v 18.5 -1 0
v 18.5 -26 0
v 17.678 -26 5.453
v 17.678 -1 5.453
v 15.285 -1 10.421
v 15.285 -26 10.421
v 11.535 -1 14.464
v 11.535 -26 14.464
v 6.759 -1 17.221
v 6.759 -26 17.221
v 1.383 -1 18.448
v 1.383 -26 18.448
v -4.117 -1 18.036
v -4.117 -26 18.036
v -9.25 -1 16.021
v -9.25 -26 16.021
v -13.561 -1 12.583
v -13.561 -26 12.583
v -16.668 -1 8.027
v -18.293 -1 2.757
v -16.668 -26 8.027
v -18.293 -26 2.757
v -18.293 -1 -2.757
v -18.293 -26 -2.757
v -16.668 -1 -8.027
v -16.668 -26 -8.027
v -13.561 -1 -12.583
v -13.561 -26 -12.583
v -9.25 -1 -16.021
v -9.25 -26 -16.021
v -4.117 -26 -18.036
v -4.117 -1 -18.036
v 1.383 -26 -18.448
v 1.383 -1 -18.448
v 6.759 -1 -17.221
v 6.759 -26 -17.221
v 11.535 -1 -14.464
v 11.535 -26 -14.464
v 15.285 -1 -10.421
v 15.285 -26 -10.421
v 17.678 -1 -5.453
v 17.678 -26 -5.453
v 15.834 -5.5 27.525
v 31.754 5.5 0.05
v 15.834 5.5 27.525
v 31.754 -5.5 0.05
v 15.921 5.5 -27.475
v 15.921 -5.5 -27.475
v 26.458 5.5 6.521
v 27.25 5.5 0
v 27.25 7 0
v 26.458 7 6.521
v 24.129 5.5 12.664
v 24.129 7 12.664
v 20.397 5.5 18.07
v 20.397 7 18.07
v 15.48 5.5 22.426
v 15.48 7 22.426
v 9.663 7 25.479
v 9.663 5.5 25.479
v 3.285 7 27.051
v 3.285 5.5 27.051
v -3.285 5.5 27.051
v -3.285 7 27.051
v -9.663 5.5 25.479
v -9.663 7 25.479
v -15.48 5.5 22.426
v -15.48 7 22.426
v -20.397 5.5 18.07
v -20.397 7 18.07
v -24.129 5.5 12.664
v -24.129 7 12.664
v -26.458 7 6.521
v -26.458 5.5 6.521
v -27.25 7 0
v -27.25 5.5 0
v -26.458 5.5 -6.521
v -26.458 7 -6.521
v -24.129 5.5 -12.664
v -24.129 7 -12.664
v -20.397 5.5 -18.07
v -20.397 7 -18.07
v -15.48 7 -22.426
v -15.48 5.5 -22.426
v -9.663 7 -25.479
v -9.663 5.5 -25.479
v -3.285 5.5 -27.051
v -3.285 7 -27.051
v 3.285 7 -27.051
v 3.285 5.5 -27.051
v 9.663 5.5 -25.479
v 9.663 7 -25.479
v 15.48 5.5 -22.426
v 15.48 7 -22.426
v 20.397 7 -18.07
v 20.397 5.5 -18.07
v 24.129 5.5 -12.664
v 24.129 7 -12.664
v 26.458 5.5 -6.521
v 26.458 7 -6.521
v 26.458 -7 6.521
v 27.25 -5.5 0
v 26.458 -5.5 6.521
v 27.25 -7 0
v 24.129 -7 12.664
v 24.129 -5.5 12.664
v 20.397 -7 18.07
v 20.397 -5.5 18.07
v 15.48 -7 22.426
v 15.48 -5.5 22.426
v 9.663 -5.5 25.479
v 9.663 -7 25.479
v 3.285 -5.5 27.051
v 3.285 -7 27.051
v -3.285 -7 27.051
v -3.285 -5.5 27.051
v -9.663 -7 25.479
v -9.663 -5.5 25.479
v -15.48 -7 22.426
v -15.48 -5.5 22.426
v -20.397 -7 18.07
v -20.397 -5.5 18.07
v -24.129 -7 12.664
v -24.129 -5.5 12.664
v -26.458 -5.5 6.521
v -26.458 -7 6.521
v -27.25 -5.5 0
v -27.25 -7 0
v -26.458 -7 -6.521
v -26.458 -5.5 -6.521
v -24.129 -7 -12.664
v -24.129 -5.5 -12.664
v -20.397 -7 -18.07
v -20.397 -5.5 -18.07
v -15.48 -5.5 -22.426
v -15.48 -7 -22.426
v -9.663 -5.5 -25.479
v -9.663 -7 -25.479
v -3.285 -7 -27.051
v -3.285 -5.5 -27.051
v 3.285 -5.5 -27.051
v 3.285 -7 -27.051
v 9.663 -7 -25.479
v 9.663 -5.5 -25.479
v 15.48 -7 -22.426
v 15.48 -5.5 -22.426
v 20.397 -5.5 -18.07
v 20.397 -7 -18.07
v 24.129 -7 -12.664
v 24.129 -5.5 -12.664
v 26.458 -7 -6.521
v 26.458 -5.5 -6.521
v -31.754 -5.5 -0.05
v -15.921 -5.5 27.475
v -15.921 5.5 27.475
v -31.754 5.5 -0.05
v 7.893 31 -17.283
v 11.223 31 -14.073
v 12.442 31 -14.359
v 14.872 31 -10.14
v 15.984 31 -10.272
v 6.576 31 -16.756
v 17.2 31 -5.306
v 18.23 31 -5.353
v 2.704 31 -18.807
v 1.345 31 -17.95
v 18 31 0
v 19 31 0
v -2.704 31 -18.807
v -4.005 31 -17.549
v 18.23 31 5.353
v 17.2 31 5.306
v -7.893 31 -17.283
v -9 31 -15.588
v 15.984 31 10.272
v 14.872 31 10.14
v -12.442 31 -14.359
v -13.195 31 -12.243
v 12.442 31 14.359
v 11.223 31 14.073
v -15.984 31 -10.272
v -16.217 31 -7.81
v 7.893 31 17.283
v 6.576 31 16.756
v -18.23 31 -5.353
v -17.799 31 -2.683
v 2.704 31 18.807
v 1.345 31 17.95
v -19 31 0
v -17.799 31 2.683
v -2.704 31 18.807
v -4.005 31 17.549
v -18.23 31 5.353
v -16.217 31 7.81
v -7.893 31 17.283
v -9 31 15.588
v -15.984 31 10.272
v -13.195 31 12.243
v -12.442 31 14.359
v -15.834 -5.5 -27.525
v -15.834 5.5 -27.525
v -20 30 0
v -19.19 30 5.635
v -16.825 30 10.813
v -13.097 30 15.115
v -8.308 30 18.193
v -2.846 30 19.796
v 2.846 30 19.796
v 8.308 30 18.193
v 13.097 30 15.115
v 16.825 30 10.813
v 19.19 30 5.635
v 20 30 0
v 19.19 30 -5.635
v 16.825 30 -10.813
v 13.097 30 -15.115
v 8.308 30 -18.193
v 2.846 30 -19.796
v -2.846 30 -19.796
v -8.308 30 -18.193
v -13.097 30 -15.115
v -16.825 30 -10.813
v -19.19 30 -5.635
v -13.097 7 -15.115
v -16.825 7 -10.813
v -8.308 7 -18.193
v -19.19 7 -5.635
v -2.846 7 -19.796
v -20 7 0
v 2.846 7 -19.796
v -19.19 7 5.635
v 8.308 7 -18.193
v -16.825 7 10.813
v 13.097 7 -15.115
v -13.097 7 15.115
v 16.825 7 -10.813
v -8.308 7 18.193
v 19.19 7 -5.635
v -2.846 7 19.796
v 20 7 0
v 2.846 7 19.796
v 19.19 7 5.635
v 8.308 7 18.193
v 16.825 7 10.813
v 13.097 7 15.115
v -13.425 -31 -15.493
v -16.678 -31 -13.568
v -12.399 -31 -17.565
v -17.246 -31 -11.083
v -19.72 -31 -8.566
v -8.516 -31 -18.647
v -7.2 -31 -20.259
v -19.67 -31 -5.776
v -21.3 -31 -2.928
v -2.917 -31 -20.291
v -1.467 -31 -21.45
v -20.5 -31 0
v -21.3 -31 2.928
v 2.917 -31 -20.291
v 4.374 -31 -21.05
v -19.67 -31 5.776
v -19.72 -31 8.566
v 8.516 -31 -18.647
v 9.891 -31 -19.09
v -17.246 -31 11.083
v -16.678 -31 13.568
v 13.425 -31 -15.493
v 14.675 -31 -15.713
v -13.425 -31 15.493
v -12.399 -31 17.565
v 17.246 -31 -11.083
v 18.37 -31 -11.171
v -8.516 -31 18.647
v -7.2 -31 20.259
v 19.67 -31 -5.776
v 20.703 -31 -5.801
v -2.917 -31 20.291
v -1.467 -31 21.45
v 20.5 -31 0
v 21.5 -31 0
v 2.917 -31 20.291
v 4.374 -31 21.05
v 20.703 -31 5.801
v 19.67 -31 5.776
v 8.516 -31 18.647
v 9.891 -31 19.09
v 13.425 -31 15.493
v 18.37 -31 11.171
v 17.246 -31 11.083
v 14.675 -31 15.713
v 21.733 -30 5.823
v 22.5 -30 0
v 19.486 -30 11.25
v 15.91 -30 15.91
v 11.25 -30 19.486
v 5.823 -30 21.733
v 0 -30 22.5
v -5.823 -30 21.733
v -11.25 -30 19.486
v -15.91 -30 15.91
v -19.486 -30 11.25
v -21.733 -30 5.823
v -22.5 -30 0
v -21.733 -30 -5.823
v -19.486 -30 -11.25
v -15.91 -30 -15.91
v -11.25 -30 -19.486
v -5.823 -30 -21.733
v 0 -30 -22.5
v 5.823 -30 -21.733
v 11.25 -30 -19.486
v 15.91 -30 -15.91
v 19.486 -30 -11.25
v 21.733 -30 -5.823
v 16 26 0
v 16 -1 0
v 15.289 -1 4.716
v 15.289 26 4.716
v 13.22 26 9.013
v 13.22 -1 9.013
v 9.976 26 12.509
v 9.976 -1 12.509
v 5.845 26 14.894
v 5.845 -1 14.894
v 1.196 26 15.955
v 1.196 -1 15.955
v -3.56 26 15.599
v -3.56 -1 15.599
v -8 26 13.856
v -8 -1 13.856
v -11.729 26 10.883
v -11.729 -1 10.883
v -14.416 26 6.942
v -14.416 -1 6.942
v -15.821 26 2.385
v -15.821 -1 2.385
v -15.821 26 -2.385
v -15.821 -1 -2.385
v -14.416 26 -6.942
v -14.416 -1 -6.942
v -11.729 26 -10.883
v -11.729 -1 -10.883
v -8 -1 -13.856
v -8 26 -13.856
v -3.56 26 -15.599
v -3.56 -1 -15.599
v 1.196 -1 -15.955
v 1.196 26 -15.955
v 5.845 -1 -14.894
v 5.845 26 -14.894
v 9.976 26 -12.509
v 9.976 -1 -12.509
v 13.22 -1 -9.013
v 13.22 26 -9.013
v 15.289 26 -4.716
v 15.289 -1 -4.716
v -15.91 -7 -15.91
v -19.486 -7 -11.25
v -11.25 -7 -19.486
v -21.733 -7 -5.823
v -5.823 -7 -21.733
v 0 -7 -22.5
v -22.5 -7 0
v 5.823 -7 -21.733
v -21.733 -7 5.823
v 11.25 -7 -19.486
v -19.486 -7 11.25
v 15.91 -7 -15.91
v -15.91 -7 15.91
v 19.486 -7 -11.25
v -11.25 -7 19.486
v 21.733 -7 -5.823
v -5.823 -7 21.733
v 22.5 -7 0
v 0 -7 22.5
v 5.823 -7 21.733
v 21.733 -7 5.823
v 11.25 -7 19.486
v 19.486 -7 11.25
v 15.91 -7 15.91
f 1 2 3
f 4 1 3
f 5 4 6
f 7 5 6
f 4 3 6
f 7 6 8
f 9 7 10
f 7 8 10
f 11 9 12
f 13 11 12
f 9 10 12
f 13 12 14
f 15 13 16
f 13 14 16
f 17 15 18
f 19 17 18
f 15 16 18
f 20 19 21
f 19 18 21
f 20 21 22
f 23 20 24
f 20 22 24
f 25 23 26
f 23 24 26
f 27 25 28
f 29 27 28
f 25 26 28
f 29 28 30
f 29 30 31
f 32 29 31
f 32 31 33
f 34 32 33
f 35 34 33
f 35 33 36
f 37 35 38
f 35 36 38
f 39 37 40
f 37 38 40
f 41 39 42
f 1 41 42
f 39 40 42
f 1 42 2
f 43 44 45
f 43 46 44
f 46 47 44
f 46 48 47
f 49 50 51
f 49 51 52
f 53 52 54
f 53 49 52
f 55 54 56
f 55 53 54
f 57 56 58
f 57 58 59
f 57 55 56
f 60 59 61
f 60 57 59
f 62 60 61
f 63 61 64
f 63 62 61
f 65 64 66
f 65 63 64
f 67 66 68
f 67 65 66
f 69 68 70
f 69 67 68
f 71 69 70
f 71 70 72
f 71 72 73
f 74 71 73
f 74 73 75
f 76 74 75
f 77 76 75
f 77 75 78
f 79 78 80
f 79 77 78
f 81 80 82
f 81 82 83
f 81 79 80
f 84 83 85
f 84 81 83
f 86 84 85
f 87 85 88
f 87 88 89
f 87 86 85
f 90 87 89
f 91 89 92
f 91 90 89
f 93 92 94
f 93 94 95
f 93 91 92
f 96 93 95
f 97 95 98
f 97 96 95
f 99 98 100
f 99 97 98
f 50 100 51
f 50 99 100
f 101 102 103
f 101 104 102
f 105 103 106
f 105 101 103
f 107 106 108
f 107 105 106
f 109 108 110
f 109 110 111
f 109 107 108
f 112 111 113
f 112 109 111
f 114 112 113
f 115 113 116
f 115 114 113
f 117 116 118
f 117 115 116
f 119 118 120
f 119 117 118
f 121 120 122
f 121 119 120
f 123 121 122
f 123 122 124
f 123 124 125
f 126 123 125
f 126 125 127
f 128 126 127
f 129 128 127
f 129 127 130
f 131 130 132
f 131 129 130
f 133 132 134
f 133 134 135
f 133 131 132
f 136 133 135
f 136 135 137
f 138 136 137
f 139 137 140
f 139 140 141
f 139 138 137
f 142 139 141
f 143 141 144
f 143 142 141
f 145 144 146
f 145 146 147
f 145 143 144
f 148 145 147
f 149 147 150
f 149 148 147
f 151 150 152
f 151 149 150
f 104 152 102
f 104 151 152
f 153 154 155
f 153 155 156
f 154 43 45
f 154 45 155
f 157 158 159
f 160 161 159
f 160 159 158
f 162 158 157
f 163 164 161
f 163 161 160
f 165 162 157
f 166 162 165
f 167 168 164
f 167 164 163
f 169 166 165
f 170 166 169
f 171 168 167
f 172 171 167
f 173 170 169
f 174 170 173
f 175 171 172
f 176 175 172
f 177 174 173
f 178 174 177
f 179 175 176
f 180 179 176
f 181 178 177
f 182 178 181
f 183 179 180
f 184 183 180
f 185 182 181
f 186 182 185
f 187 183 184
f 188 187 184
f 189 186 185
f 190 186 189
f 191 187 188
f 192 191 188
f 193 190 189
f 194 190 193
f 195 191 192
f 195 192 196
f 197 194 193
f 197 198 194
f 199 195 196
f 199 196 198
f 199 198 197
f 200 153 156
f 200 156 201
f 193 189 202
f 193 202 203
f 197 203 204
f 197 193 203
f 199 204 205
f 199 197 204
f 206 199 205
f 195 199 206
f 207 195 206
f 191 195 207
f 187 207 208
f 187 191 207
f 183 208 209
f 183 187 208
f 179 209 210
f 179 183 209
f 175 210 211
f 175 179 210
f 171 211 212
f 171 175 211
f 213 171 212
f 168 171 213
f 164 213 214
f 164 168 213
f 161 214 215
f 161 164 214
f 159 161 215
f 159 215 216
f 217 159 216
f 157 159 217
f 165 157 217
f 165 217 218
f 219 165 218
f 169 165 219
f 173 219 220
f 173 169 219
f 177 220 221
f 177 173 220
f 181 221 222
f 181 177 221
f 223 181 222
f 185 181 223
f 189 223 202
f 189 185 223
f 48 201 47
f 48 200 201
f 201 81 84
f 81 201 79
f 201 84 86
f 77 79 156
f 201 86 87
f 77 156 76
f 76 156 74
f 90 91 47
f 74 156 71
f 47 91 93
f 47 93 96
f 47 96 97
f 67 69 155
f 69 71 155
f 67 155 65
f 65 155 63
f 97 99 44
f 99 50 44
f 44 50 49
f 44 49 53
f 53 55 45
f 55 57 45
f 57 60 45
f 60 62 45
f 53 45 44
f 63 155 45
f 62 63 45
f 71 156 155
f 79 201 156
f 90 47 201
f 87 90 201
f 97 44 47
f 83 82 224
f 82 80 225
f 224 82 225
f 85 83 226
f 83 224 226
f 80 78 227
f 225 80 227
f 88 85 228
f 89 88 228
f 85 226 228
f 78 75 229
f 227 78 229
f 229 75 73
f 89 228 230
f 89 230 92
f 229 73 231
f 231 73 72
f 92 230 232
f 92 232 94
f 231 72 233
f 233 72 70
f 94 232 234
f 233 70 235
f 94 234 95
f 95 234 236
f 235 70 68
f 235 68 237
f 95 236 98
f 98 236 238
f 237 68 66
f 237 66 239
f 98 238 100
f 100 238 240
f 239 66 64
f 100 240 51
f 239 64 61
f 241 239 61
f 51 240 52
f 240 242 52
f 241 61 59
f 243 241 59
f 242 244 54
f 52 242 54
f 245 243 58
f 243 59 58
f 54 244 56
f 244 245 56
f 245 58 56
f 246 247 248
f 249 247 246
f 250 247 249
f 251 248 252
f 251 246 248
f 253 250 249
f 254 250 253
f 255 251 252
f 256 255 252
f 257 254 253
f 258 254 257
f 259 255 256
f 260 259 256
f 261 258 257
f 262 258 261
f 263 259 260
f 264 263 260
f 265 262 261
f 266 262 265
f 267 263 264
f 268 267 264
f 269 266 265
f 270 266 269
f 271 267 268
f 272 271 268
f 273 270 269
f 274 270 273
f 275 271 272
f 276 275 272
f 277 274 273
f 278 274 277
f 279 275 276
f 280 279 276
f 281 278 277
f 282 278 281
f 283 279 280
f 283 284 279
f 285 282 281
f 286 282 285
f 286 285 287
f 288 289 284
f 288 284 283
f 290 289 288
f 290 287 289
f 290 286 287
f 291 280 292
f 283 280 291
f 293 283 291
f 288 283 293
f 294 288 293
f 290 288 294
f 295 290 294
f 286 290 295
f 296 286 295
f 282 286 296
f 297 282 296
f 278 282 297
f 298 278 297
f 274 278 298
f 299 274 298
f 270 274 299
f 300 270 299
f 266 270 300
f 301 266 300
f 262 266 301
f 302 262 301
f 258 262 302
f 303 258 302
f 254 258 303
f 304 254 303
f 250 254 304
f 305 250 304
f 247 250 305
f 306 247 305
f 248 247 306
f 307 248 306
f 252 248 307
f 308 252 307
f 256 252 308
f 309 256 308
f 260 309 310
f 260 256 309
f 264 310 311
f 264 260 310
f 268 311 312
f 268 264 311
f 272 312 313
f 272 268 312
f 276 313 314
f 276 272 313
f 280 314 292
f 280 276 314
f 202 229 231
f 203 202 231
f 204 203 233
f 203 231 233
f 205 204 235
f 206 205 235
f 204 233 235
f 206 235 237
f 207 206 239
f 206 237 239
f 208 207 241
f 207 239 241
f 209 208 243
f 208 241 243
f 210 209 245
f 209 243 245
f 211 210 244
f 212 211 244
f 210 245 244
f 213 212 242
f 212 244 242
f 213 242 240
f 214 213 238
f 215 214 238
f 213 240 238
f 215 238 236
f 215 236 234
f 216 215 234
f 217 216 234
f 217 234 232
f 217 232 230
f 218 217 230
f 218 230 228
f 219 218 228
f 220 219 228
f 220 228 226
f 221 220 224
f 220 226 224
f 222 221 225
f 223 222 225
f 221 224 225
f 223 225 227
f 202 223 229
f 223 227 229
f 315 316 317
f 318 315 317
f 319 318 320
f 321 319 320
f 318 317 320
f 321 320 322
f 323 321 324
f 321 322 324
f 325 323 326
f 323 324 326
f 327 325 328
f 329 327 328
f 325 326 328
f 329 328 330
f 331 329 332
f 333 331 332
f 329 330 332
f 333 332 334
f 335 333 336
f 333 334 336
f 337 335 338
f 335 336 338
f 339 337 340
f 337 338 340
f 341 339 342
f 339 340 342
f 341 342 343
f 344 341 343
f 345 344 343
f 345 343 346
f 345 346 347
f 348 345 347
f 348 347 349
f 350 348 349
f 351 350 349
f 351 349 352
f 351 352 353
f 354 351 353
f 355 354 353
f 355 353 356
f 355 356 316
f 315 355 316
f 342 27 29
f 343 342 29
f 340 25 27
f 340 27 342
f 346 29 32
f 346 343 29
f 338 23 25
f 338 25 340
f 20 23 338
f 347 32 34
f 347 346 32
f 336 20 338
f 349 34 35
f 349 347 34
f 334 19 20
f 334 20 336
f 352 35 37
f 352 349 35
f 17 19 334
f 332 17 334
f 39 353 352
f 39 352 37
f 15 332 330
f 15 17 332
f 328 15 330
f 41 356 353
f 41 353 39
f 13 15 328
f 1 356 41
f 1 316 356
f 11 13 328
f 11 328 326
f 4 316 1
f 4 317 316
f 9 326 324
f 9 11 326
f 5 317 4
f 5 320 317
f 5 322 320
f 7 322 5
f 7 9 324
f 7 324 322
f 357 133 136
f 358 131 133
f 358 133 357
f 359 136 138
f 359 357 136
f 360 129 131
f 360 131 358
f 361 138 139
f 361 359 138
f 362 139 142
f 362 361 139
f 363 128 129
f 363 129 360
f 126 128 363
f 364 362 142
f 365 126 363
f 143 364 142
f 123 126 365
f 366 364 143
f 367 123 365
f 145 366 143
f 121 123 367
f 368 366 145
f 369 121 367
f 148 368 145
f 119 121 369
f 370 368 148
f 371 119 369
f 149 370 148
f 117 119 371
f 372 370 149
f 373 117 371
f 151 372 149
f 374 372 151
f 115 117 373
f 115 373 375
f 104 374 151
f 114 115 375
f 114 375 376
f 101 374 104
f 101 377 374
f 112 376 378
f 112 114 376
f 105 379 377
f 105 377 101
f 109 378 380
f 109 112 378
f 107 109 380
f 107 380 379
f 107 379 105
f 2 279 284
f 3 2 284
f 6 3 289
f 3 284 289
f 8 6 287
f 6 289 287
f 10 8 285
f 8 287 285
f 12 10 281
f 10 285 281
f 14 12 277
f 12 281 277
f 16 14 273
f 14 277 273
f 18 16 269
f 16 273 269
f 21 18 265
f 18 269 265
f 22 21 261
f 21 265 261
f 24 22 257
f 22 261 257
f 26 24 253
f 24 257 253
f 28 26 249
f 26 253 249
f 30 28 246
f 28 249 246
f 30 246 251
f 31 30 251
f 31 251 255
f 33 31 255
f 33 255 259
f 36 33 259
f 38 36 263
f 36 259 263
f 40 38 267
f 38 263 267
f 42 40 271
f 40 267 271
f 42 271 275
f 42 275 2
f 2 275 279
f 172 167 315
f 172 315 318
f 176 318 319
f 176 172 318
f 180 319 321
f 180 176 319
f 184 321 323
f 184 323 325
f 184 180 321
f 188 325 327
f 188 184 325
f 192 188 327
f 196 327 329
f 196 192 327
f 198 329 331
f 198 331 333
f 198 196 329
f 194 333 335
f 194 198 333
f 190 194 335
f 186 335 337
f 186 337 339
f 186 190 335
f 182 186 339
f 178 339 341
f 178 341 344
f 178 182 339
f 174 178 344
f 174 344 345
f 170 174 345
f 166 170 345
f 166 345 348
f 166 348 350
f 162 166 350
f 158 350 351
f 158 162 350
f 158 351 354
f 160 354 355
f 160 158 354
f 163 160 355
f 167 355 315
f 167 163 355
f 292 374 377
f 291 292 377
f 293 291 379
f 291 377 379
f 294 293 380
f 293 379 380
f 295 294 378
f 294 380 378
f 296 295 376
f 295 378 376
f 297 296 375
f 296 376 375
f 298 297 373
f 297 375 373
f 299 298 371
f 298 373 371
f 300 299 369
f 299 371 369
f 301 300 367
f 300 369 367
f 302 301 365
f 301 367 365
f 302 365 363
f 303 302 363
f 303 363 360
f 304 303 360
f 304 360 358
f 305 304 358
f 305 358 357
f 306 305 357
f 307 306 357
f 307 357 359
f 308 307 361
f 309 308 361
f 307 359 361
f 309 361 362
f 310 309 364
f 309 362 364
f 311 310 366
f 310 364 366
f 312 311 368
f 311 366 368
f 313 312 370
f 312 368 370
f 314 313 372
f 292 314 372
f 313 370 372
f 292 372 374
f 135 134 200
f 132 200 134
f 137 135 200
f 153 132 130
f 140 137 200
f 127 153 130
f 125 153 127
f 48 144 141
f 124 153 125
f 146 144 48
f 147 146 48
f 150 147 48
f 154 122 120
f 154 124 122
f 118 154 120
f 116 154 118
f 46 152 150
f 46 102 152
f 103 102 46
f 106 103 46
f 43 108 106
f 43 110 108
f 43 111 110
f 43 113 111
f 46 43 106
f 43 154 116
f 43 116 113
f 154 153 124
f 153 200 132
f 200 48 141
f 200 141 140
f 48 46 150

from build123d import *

# Parameters (mm, degrees)
F1_DEPTH    = 5.5
F2_R        = 27.25
F3_DEPTH    = 7
F4_R        = 22.5
F5_DEPTH    = 24
F6_R        = 20
F7_DEPTH    = 24
F8_R        = 16
F9_DEPTH    = 62.001
F10_R       = 18.5
F11_DEPTH   = 30
F12_SIZE    = 1
F13_SIZE2   = 2
F13_SIZE    = 5
F13_2_SIZE2 = 2
F13_2_SIZE  = 5


with BuildPart() as f1:
    # F0 (on Front) → F1 (new body, symmetric)
    with BuildSketch(Plane.XZ):
        Polygon((31.7542252363, 0.0501296029), (15.8336991085, 27.5250305336), (-15.9205261278, 27.4749009306), (-31.7542252363, -0.0501296029), (-15.8336991085, -27.5250305336), (15.9205261278, -27.4749009306), align=None)
    extrude(amount=F1_DEPTH, both=True)

    # F2 (on Front) → F3 (join, symmetric)
    with BuildSketch(Plane.XZ):
        Circle(F2_R)
    extrude(amount=F3_DEPTH, both=True)

    # F4 (on face) → F5 (join)
    with BuildSketch(Plane.XZ.offset(7)):
        Circle(F4_R)
    extrude(amount=F5_DEPTH)

    # F6 (on face) → F7 (join)
    with BuildSketch(Plane(origin=(0, 7, 0), x_dir=(-1, 0, 0), z_dir=(0, 1, 0))):
        Circle(F6_R)
    extrude(amount=F7_DEPTH)

    # F8 (on face) → F9 (cut, through all)
    with BuildSketch(Plane.XZ.offset(31)):
        Circle(F8_R)
    extrude(amount=-F9_DEPTH, mode=Mode.SUBTRACT)

    # F10 (on face) → F11 (cut)
    with BuildSketch(Plane.XZ.offset(31)):
        Circle(F10_R)
    extrude(amount=-F11_DEPTH, mode=Mode.SUBTRACT)

    # F12
    f12_edges = [f1.edges().sort_by_distance(p)[0] for p in [
        (-22.5, -31, 0),
        (20, 31, 0),
    ]]
    chamfer(f12_edges, length=F12_SIZE)

    # F13
    f13_edges = [f1.edges().sort_by_distance(p)[0] for p in [
        (-18.5, -31, 0),
    ]]
    f13_side = f1.faces().sort_by_distance((-18.5, -16, 0))[0]
    chamfer(f13_edges, length=F13_SIZE, length2=F13_SIZE2, reference=f13_side)

    # F13#2
    f13_2_edges = [f1.edges().sort_by_distance(p)[0] for p in [
        (-16, 31, 0),
    ]]
    f13_2_side = f1.faces().sort_by_distance((-16, 15, 0))[0]
    chamfer(f13_2_edges, length=F13_2_SIZE, length2=F13_2_SIZE2, reference=f13_2_side)


solid = f1.part
